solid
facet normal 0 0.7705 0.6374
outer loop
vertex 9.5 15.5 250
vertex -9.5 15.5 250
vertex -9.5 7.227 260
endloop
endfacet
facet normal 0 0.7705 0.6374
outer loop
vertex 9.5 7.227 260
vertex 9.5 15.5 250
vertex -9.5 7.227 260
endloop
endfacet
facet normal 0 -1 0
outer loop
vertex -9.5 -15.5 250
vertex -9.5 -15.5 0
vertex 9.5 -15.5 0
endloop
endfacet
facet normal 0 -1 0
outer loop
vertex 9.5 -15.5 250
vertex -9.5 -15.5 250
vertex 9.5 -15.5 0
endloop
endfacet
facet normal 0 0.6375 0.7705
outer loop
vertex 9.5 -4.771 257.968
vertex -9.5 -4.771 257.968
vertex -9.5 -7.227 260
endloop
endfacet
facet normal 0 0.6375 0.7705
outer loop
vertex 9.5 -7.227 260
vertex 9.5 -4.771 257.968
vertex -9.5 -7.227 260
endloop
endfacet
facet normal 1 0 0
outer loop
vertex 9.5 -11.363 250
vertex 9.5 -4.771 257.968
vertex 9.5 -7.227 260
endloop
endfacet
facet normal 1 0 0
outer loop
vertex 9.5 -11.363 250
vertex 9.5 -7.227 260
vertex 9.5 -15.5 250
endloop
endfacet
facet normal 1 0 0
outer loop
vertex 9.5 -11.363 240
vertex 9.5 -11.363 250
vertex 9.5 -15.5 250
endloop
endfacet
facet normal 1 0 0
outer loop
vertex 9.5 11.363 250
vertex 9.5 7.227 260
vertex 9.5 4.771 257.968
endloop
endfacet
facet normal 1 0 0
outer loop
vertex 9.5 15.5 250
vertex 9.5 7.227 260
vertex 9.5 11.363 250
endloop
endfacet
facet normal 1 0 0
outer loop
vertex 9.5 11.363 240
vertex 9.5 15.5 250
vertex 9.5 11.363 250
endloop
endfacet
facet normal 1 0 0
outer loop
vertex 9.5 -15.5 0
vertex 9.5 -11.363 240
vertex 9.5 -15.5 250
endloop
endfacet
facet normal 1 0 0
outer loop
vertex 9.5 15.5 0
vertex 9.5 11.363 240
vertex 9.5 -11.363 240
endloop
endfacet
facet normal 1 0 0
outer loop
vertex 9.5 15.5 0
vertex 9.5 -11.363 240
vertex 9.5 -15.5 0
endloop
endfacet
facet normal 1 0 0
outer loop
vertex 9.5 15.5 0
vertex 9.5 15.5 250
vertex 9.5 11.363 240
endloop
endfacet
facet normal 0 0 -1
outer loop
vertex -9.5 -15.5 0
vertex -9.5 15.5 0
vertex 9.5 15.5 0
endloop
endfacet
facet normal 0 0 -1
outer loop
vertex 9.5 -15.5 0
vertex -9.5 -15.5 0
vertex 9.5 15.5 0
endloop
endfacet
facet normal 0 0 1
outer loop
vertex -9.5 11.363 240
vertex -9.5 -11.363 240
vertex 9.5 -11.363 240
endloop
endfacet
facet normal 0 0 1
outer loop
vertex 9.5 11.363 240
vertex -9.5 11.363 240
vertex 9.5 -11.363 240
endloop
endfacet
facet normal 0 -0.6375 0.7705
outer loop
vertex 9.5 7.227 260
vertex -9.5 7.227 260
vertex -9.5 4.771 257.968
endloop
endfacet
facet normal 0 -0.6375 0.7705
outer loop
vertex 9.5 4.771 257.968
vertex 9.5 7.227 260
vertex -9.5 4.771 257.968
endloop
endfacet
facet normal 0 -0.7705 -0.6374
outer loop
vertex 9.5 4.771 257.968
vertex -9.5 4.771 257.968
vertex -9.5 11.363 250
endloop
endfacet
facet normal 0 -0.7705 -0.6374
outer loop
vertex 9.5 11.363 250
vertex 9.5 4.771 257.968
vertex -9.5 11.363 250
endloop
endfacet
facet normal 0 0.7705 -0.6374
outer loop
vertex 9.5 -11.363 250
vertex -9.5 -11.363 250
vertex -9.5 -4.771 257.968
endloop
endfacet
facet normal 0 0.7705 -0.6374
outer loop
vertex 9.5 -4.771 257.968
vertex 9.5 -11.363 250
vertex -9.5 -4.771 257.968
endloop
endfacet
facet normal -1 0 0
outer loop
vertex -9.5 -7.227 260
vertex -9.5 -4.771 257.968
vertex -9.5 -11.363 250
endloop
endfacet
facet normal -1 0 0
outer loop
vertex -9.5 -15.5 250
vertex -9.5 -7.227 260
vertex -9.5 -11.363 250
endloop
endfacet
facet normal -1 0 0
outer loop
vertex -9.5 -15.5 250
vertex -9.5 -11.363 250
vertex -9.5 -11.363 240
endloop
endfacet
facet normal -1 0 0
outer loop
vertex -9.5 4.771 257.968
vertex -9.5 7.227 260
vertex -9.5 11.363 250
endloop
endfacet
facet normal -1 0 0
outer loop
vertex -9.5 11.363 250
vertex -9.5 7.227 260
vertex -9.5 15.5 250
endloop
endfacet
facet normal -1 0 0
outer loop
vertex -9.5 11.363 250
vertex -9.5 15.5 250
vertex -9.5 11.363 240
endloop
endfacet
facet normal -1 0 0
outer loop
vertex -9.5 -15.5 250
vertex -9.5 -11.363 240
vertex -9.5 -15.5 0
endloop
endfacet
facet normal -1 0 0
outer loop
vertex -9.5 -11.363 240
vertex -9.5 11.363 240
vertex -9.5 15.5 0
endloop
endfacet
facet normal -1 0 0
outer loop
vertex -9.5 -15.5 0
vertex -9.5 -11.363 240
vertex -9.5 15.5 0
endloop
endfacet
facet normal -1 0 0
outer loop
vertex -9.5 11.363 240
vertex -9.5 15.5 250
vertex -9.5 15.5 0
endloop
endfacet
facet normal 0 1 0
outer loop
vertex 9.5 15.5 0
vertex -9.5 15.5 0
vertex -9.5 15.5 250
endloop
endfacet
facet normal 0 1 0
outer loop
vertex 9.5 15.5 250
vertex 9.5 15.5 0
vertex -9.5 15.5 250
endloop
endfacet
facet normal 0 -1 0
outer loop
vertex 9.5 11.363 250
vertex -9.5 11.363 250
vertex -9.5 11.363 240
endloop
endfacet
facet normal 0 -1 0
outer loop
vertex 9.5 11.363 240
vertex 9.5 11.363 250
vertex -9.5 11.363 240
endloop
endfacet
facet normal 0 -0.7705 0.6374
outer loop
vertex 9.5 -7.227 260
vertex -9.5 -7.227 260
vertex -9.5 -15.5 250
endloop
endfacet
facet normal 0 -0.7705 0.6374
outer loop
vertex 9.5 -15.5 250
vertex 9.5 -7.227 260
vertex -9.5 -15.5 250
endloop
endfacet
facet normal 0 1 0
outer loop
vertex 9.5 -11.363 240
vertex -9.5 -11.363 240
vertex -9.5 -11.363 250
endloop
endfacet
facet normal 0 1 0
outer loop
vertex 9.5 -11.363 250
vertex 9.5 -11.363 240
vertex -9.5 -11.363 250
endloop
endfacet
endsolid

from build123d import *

# Parameters (mm, degrees)
SKETCH1_W           = 19
SKETCH1_H           = 31
BOSS_EXTRUDE1_DEPTH = 240
BOSS_EXTRUDE2_DEPTH = 19


with BuildPart() as part:
    # Sketch1 → Boss-Extrude1 (new body)
    with BuildSketch(Plane.XY):
        Rectangle(SKETCH1_W, SKETCH1_H)
    extrude(amount=BOSS_EXTRUDE1_DEPTH)

    # Sketch2 → Boss-Extrude2 (add)
    with BuildSketch(Plane.ZY.offset(9.5)):
        Polygon((240, 15.5), (250, 15.5), (260, 7.226546943), (257.968239385, 4.770788022), (250, 11.363273472), (240, 11.363273472), align=None)
        Polygon((240, -15.5), (240, -11.363273472), (250, -11.363273472), (257.968239385, -4.770788022), (260, -7.226546943), (250, -15.5), align=None)
    extrude(amount=-BOSS_EXTRUDE2_DEPTH)


solid = part.part
